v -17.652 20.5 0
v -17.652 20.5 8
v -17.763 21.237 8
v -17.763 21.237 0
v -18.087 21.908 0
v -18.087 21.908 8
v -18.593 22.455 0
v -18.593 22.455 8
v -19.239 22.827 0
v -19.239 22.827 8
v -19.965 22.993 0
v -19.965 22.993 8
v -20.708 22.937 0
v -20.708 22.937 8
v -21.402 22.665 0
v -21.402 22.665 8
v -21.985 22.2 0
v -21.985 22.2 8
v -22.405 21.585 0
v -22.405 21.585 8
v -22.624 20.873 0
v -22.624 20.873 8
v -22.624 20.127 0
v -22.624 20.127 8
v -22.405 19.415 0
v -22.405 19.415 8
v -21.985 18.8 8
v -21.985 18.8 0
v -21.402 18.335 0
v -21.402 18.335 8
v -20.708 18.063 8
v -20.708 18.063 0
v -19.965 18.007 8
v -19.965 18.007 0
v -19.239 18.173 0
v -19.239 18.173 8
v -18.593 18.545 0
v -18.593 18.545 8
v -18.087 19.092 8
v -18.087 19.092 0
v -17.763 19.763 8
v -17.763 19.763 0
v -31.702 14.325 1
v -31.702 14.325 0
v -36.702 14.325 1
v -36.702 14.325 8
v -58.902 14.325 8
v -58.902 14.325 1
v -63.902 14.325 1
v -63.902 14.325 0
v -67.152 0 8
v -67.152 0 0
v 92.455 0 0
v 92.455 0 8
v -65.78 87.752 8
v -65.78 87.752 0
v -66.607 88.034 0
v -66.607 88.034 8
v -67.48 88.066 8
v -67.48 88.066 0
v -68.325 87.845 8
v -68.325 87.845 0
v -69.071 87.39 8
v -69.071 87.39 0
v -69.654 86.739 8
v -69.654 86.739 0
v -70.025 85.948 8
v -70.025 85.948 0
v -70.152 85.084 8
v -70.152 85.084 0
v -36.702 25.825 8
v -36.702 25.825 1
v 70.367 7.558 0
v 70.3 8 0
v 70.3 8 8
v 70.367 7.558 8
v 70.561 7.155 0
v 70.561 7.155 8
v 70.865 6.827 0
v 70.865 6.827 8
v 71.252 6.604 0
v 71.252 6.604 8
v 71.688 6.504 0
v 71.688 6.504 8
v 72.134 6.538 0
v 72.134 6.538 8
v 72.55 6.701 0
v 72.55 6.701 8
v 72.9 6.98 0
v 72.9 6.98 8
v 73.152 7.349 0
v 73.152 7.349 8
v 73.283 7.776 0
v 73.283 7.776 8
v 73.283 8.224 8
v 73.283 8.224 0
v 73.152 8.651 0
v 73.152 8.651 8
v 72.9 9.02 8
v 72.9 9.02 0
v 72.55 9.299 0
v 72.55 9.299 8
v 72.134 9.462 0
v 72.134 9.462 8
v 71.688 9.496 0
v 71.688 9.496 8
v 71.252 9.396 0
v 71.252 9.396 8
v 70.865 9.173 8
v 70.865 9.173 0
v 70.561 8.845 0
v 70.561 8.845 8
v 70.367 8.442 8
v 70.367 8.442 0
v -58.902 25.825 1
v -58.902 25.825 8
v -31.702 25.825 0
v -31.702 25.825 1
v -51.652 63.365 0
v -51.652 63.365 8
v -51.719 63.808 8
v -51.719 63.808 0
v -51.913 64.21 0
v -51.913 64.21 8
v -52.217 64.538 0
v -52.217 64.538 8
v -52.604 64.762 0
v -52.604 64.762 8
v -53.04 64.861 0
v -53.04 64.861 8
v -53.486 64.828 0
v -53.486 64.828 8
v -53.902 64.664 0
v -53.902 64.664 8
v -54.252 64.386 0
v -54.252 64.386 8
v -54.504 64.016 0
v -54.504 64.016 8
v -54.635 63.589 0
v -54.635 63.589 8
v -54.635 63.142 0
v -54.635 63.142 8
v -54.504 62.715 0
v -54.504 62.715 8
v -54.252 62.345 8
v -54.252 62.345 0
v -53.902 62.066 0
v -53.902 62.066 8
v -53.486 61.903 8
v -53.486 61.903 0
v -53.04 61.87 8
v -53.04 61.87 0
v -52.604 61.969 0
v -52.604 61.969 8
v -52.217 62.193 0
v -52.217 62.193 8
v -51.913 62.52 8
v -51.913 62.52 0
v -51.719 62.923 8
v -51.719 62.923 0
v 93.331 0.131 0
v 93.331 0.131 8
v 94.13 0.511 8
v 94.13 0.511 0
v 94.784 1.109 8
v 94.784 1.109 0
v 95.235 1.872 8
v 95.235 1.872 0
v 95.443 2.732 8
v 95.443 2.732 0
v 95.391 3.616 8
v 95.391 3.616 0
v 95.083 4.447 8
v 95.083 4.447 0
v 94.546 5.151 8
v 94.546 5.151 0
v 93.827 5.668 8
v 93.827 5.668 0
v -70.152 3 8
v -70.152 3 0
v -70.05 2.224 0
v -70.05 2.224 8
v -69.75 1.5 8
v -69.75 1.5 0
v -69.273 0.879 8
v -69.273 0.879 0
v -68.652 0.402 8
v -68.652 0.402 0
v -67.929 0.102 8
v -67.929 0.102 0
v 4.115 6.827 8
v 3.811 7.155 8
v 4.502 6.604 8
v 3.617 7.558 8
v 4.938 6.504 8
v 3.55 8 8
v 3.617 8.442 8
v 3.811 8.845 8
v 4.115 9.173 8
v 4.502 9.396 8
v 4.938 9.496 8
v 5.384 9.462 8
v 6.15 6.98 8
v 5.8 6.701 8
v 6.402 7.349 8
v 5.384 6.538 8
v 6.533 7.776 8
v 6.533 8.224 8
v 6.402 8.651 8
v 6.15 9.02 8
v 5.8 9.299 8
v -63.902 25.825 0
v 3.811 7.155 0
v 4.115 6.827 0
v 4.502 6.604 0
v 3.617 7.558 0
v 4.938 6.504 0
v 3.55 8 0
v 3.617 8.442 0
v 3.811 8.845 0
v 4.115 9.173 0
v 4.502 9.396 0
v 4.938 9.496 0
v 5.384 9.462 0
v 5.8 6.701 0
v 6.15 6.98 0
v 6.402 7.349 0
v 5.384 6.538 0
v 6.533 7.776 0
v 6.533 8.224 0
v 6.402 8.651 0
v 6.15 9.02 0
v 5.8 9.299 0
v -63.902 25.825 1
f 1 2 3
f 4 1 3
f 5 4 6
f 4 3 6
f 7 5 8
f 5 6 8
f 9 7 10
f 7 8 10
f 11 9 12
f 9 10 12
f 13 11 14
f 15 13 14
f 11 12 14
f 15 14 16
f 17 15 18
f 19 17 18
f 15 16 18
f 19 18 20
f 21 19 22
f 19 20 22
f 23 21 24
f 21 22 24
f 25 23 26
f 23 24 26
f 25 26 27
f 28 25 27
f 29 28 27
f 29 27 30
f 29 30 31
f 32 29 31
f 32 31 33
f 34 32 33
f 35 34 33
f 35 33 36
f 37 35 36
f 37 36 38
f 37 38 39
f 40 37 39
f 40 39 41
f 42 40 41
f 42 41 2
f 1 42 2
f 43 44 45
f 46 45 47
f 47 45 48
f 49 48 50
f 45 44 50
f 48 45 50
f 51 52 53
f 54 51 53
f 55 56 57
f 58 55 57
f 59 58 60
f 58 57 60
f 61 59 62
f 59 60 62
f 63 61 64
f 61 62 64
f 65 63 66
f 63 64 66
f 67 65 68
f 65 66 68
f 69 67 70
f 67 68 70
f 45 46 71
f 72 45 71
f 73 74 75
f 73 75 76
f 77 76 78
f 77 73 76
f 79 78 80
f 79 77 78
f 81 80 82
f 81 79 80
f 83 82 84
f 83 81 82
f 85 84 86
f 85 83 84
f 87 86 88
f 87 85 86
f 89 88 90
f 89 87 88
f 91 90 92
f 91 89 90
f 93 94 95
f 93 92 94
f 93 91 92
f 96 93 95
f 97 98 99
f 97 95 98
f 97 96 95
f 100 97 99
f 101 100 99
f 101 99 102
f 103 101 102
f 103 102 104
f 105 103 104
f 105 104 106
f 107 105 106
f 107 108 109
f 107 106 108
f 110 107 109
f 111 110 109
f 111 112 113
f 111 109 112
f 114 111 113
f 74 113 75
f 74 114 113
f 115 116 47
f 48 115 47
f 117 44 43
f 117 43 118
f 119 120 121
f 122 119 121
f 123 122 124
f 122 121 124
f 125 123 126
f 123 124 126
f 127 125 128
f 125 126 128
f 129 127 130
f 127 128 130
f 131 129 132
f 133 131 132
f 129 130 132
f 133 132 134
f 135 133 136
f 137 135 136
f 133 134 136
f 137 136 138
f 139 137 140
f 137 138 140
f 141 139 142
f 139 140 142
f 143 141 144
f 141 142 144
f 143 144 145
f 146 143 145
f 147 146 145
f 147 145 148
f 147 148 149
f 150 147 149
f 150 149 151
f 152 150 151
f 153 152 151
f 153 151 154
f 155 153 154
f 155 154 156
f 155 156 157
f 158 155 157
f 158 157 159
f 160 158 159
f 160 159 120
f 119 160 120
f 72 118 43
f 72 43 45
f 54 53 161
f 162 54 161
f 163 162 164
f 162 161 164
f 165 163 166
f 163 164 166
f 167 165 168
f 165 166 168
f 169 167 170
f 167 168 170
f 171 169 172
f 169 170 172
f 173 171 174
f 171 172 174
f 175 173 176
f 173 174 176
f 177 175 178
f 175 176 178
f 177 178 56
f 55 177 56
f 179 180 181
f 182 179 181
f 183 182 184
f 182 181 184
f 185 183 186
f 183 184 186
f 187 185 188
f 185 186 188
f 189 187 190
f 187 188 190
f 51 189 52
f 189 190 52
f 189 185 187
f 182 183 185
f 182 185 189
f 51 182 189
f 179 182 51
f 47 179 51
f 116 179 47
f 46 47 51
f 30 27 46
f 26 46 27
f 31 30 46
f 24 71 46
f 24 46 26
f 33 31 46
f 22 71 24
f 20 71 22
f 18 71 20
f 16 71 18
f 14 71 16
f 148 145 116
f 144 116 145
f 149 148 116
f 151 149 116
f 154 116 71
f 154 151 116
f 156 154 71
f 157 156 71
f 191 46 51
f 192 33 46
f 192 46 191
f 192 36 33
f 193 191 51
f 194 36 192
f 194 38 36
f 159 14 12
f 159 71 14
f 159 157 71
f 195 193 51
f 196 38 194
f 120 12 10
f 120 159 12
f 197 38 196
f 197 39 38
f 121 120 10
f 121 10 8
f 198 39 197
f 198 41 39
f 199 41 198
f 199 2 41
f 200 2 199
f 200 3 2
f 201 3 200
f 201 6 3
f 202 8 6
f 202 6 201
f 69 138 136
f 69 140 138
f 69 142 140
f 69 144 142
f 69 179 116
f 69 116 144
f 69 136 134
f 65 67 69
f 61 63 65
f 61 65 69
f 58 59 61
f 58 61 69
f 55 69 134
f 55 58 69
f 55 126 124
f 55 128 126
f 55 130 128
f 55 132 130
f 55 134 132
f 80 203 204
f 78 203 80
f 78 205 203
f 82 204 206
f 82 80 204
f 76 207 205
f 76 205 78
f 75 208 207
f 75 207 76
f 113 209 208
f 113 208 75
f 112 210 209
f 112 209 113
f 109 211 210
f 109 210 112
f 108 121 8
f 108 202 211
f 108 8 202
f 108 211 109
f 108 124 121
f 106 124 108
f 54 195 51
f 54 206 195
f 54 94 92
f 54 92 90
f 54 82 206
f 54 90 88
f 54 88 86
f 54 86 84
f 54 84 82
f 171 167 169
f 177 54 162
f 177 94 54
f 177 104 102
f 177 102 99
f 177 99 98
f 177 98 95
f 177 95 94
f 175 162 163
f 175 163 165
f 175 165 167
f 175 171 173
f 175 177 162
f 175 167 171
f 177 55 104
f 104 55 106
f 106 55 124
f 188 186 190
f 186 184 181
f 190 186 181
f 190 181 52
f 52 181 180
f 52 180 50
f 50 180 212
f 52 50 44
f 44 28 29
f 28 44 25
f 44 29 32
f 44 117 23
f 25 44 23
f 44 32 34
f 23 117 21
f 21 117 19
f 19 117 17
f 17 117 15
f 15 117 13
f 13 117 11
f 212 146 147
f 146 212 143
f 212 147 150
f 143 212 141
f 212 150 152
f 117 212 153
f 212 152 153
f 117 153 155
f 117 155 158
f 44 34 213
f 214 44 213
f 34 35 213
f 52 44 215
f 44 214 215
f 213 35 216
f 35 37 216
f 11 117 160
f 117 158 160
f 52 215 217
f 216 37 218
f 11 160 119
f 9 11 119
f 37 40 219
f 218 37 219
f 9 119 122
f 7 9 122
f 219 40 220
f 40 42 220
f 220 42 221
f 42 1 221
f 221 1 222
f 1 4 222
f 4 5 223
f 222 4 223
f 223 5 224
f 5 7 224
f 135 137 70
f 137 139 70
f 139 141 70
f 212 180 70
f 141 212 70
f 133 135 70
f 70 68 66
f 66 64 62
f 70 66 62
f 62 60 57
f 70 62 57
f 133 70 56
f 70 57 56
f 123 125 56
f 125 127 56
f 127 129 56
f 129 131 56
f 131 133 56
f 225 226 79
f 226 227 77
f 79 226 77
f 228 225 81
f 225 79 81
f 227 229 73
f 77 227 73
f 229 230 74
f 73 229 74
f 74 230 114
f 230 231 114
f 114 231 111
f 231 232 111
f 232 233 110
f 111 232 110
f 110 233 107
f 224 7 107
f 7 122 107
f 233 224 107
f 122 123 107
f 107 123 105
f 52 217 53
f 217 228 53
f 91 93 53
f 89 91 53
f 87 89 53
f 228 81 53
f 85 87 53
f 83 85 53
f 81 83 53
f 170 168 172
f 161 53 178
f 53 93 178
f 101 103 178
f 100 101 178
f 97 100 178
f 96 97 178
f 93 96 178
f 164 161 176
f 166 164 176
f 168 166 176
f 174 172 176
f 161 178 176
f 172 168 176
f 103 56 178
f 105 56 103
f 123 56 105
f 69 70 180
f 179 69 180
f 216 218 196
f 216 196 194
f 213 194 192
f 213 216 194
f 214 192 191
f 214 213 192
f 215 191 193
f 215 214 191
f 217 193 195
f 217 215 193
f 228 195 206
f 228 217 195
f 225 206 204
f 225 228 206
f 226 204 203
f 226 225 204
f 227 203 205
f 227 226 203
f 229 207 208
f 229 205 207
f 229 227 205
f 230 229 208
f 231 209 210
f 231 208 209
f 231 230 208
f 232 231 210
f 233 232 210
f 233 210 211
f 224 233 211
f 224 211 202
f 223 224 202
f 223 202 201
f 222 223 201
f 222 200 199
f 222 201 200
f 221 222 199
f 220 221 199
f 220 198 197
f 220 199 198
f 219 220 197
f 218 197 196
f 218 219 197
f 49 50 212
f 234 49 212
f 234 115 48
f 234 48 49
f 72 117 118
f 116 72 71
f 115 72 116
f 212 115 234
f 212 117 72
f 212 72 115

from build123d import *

# Parameters (mm, degrees)
BOSS_EXTRUDE1_DEPTH     = 8
CUT_EXTRUDE6_DEPTH      = 30
CUT_EXTRUDE6_DEPTH_BACK = 30
SKETCH3_R               = 1.5
SKETCH8_W               = 22.2
SKETCH8_H               = 11.5
CUT_EXTRUDE9_DEPTH      = 20
SKETCH11_W              = 5
SKETCH11_H              = 11.5
CUT_EXTRUDE10_DEPTH     = 1
SKETCH8_6_R             = 1.5
CUT_EXTRUDE11_DEPTH     = 10
SKETCH12_R              = 2.5
CUT_EXTRUDE12_DEPTH     = 20


with BuildPart() as part:
    # Sketch1 → Boss-Extrude1 (new body)
    with BuildSketch(Plane.XY):
        with BuildLine():
            Line((-67.152143845, 0), (92.454966604, 0))
            ThreePointArc((92.454966604, 0), (95.370750394, 2.294163695), (93.827010641, 5.667863407))
            Line((93.827010641, 5.667863407), (-65.780099807, 87.751520209))
            ThreePointArc((-65.780099807, 87.751520209), (-68.714812698, 87.64452893), (-70.152143845, 85.083656802))
            Line((-70.152143845, 85.083656802), (-70.152143845, 3))
            ThreePointArc((-70.152143845, 3), (-69.273464189, 0.878679656), (-67.152143845, 0))
        make_face()
    extrude(amount=BOSS_EXTRUDE1_DEPTH)

    # Sketch3 → Cut-Extrude6 (cut, two sides: drawn at the far end of the back side and taken through both)
    with BuildSketch(Plane.XY.offset(-CUT_EXTRUDE6_DEPTH_BACK)):
        with Locations((71.800150685, 8)):
            Circle(SKETCH3_R)
        with Locations((5.050150685, 8)):
            Circle(SKETCH3_R)
    extrude(amount=CUT_EXTRUDE6_DEPTH + CUT_EXTRUDE6_DEPTH_BACK, mode=Mode.SUBTRACT)

    # Sketch8 → Cut-Extrude9 (cut)
    with BuildSketch(Plane.XY.offset(8)):
        with Locations((-47.802143845, 20.074774739)):
            Rectangle(SKETCH8_W, SKETCH8_H)
    extrude(amount=-CUT_EXTRUDE9_DEPTH, mode=Mode.SUBTRACT)

    # Sketch11 → Cut-Extrude10 (cut)
    with BuildSketch(Plane(origin=(0, 0, 0), x_dir=(-1, 0, 0), z_dir=(0, 0, -1))):
        with Locations((61.402143845, 20.074774739)):
            Rectangle(SKETCH11_W, SKETCH11_H)
        with Locations((34.202143845, 20.074774739)):
            Rectangle(SKETCH11_W, SKETCH11_H)
    extrude(amount=-CUT_EXTRUDE10_DEPTH, mode=Mode.SUBTRACT)

    # Sketch8<6> → Cut-Extrude11 (cut)
    with BuildSketch(Plane.XY.offset(8)):
        with Locations((-53.152143845, 63.365389143)):
            Circle(SKETCH8_6_R)
    extrude(amount=-CUT_EXTRUDE11_DEPTH, mode=Mode.SUBTRACT)

    # Sketch12 → Cut-Extrude12 (cut)
    with BuildSketch(Plane.XY.offset(8)):
        with Locations((-20.152143845, 20.5)):
            Circle(SKETCH12_R)
    extrude(amount=-CUT_EXTRUDE12_DEPTH, mode=Mode.SUBTRACT)


solid = part.part
